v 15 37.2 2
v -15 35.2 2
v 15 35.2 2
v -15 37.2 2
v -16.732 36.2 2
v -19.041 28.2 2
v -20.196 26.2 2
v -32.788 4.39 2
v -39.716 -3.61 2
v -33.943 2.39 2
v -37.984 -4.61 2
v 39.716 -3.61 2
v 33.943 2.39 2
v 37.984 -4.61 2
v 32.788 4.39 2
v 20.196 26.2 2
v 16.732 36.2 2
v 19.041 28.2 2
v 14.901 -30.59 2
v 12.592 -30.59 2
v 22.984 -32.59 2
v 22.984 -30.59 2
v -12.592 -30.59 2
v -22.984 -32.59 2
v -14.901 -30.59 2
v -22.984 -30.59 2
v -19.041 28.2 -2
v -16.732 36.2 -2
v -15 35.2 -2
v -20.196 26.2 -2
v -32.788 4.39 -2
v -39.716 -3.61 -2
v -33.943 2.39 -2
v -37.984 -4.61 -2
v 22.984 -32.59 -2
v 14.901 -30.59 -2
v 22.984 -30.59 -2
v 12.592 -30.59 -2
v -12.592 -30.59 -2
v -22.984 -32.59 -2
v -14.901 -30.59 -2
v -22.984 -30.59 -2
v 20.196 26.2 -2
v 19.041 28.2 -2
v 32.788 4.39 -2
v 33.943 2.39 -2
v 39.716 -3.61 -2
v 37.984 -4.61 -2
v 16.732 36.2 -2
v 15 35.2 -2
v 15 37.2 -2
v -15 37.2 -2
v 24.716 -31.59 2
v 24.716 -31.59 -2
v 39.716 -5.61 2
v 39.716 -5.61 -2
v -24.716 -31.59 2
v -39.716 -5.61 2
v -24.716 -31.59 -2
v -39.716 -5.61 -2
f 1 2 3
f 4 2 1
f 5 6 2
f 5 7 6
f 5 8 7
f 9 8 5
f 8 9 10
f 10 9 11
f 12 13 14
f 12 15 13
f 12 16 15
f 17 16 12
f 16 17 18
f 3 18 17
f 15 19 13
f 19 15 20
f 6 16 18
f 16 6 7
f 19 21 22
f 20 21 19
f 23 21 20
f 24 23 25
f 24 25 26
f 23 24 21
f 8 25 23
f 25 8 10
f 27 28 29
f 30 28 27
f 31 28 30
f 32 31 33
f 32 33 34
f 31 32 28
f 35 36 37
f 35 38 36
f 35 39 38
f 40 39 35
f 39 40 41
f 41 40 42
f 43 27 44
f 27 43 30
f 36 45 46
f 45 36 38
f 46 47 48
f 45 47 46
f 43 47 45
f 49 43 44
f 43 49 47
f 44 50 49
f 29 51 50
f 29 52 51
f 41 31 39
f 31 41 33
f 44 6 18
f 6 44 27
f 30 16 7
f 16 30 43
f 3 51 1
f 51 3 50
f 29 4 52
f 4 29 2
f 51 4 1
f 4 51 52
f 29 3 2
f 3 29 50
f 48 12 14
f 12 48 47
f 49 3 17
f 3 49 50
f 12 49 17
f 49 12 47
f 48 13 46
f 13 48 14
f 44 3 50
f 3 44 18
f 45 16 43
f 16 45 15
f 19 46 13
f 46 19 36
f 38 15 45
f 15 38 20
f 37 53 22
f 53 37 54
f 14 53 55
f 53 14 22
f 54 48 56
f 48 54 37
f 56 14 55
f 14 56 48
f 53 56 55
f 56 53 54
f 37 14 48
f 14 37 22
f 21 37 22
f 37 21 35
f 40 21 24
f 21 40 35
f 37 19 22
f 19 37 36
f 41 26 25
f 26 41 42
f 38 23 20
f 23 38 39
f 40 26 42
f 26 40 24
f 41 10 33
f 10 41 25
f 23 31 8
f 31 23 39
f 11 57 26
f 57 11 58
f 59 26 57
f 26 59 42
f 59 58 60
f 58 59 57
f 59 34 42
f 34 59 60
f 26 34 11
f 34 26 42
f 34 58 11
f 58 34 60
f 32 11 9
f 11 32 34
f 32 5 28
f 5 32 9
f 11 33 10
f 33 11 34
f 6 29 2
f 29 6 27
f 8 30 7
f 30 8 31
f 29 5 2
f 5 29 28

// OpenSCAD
// Generated by SolidPython 1.1.3 on 2023-10-31 11:39:34
$fn = 48;


union() {
	union() {
		color(alpha = 1.0000000000, c = "Red") {
			translate(v = [ 0. ,27.2, 0. ]) {
				rotate(a = [0, 0, -0.0000000000]) {
					cube(center = true, size = [41.54700538379251, 2, 4]);
				}
			}
		}
	}
	union() {
		color(alpha = 1.0000000000, c = "Orange") {
			translate(v = [ 0. ,36.2, 0. ]) {
				rotate(a = [0, 0, -0.0000000000]) {
					cube(center = true, size = [30, 2, 4]);
				}
			}
		}
	}
	union() {
		color(alpha = 1.0000000000, c = "Purple") {
			translate(v = [27.35807251,15.79519053, 0.        ]) {
				rotate(a = [0, 0, -60.0000000000]) {
					cube(center = true, size = [45.968188426424476, 2, 4]);
				}
			}
		}
	}
	union() {
		color(alpha = 1.0000000000, c = "Red") {
			translate(v = [ 23.55589098,-13.6       ,  0.        ]) {
				rotate(a = [0, 0, -120.0000000000]) {
					cube(center = true, size = [41.54700538379251, 2, 4]);
				}
			}
		}
	}
	union() {
		color(alpha = 1.0000000000, c = "Orange") {
			translate(v = [ 31.35011962,-18.1       ,  0.        ]) {
				rotate(a = [0, 0, -120.0000000000]) {
					cube(center = true, size = [30, 2, 4]);
				}
			}
		}
	}
	union() {
		color(alpha = 1.0000000000, c = "Purple") {
			translate(v = [ 3.86870590e-15,-3.15903811e+01, 0.00000000e+00]) {
				rotate(a = [0, 0, -180.0000000000]) {
					cube(center = true, size = [45.968188426424476, 2, 4]);
				}
			}
		}
	}
	union() {
		color(alpha = 1.0000000000, c = "Red") {
			translate(v = [-23.55589098,-13.6       ,  0.        ]) {
				rotate(a = [0, 0, -240.0000000000]) {
					cube(center = true, size = [41.54700538379251, 2, 4]);
				}
			}
		}
	}
	union() {
		color(alpha = 1.0000000000, c = "Orange") {
			translate(v = [-31.35011962,-18.1       ,  0.        ]) {
				rotate(a = [0, 0, -240.0000000000]) {
					cube(center = true, size = [30, 2, 4]);
				}
			}
		}
	}
	union() {
		color(alpha = 1.0000000000, c = "Purple") {
			translate(v = [-27.35807251, 15.79519053,  0.        ]) {
				rotate(a = [0, 0, -300.0000000000]) {
					cube(center = true, size = [45.968188426424476, 2, 4]);
				}
			}
		}
	}
}
/***********************************************
*********      SolidPython code:      **********
************************************************
 
#! /usr/bin/env python3
import sys
import numpy as np
from solid import scad_render_to_file
from solid.objects import cube, translate, union, rotate, color

SEGMENTS = 48

radial_vector0 = np.array([ 31., -19., 0.])
radial_vector0 /= np.linalg.norm(radial_vector0)
radial_vector1 = np.array([-31., -19., 0.])
radial_vector1 /= np.linalg.norm(radial_vector1)

side_count = 3
step_angle = 360/side_count
step_angle_rad = np.deg2rad(step_angle)
rad_size = 30 # Length from center to outer wheel
piece_width = 2 # cm
hpw = piece_width*.5

wheel_gap = 9
ctiw = 35.2 # Center to inner wheel support
ctow = ctiw-wheel_gap # Center to outer wheel support
wsl = 30 # Wheel support length

p1 = np.array([wsl*.5, ctiw, 0.])
p2 = np.array([np.sin(step_angle_rad), np.cos(step_angle_rad), 0.]) * ctiw - np.array([np.sin(step_angle_rad+np.pi*.5), np.cos(step_angle_rad+np.pi*.5), 0.]) * wsl*.5
boll = np.linalg.norm(p1-p2) # Big outer lines length
bolr = np.linalg.norm((p1+p2)*.5)# Big outer lines rad length

# Inner inner wheel support
iiwsl = wsl+((wheel_gap+piece_width*.5)*np.tan((side_count*2-2)*np.pi/(side_count*2)-np.pi*.5))*2
print(iiwsl)

def rotate_vec(vec, angle):
    angle = np.deg2rad(angle)
    new_vec = np.copy(vec)
    new_vec[0] = vec[0] * np.cos(angle) - vec[1] * np.sin(angle)
    new_vec[1] = vec[0] * np.sin(angle) + vec[1] * np.cos(angle)
    return new_vec

def basic_geometry():

    shapes = []
    for i in range(side_count):
        dir_vector = np.array([np.sin(i*step_angle_rad), np.cos(i*step_angle_rad), 0.])
        rot = -step_angle*i
        outer_wheel_support = union()(
                                color("Red")(
                                    translate(dir_vector*(ctow+hpw))(
                                        rotate((0, 0, rot))(
                                            cube([iiwsl, 2, 4], center=True)))))
        shapes.append(outer_wheel_support)
        inner_wheel_support = union()(
                                color("Orange")(
                                    translate(dir_vector*(ctiw+hpw))(
                                        rotate((0, 0, rot))(
                                            cube([wsl, 2, 4], center=True)))))
        shapes.append(inner_wheel_support)

        dir_vector = np.array([np.sin(i*step_angle_rad+step_angle_rad*.5), np.cos(i*step_angle_rad+step_angle_rad*.5), 0.])
        rot -= step_angle*.5
        big_outer_line = union()(
                            color("Purple")(
                                translate(dir_vector*(bolr+hpw))(
                                    rotate((0, 0, rot))(
                                        cube([boll, 2, 4], center=True)))))
        shapes.append(big_outer_line)

    """
    print(f"Red:         {wsl:.1f} cm")
    print(f"Orange:      {wsl:.1f} cm")
    print(f"Yellow:      {cil:.1f} cm - angle cut")
    print(f"Green:       {rcl:.1f} cm")
    print(f"Blue:         {wssl:.1f} cm")
    print(f"Purple:      {boll:.1f} cm")
    print("--------------------------")
    print(f"Diameter:   {(np.linalg.norm(np.array([wsl*.5, ctow]))*2):.1f} cm")
    """
    print(f"Orange:      {wsl:.1f} cm")
    print(f"Purple:      {boll:.1f} cm")
    print(f"Red:         {iiwsl:.1f} cm")
    
    return union()(*shapes)

if __name__ == '__main__':
    out_dir = sys.argv[1] if len(sys.argv) > 1 else None

    a = basic_geometry()

    # Adding the file_header argument as shown allows you to change
    # the detail of arcs by changing the SEGMENTS variable.  This can
    # be expensive when making lots of small curves, but is otherwise
    # useful.
    file_out = scad_render_to_file(a, out_dir=out_dir, file_header=f'$fn = {SEGMENTS};')
    print(f"{__file__}: SCAD file written to: \n{file_out}")
 
 
************************************************/
